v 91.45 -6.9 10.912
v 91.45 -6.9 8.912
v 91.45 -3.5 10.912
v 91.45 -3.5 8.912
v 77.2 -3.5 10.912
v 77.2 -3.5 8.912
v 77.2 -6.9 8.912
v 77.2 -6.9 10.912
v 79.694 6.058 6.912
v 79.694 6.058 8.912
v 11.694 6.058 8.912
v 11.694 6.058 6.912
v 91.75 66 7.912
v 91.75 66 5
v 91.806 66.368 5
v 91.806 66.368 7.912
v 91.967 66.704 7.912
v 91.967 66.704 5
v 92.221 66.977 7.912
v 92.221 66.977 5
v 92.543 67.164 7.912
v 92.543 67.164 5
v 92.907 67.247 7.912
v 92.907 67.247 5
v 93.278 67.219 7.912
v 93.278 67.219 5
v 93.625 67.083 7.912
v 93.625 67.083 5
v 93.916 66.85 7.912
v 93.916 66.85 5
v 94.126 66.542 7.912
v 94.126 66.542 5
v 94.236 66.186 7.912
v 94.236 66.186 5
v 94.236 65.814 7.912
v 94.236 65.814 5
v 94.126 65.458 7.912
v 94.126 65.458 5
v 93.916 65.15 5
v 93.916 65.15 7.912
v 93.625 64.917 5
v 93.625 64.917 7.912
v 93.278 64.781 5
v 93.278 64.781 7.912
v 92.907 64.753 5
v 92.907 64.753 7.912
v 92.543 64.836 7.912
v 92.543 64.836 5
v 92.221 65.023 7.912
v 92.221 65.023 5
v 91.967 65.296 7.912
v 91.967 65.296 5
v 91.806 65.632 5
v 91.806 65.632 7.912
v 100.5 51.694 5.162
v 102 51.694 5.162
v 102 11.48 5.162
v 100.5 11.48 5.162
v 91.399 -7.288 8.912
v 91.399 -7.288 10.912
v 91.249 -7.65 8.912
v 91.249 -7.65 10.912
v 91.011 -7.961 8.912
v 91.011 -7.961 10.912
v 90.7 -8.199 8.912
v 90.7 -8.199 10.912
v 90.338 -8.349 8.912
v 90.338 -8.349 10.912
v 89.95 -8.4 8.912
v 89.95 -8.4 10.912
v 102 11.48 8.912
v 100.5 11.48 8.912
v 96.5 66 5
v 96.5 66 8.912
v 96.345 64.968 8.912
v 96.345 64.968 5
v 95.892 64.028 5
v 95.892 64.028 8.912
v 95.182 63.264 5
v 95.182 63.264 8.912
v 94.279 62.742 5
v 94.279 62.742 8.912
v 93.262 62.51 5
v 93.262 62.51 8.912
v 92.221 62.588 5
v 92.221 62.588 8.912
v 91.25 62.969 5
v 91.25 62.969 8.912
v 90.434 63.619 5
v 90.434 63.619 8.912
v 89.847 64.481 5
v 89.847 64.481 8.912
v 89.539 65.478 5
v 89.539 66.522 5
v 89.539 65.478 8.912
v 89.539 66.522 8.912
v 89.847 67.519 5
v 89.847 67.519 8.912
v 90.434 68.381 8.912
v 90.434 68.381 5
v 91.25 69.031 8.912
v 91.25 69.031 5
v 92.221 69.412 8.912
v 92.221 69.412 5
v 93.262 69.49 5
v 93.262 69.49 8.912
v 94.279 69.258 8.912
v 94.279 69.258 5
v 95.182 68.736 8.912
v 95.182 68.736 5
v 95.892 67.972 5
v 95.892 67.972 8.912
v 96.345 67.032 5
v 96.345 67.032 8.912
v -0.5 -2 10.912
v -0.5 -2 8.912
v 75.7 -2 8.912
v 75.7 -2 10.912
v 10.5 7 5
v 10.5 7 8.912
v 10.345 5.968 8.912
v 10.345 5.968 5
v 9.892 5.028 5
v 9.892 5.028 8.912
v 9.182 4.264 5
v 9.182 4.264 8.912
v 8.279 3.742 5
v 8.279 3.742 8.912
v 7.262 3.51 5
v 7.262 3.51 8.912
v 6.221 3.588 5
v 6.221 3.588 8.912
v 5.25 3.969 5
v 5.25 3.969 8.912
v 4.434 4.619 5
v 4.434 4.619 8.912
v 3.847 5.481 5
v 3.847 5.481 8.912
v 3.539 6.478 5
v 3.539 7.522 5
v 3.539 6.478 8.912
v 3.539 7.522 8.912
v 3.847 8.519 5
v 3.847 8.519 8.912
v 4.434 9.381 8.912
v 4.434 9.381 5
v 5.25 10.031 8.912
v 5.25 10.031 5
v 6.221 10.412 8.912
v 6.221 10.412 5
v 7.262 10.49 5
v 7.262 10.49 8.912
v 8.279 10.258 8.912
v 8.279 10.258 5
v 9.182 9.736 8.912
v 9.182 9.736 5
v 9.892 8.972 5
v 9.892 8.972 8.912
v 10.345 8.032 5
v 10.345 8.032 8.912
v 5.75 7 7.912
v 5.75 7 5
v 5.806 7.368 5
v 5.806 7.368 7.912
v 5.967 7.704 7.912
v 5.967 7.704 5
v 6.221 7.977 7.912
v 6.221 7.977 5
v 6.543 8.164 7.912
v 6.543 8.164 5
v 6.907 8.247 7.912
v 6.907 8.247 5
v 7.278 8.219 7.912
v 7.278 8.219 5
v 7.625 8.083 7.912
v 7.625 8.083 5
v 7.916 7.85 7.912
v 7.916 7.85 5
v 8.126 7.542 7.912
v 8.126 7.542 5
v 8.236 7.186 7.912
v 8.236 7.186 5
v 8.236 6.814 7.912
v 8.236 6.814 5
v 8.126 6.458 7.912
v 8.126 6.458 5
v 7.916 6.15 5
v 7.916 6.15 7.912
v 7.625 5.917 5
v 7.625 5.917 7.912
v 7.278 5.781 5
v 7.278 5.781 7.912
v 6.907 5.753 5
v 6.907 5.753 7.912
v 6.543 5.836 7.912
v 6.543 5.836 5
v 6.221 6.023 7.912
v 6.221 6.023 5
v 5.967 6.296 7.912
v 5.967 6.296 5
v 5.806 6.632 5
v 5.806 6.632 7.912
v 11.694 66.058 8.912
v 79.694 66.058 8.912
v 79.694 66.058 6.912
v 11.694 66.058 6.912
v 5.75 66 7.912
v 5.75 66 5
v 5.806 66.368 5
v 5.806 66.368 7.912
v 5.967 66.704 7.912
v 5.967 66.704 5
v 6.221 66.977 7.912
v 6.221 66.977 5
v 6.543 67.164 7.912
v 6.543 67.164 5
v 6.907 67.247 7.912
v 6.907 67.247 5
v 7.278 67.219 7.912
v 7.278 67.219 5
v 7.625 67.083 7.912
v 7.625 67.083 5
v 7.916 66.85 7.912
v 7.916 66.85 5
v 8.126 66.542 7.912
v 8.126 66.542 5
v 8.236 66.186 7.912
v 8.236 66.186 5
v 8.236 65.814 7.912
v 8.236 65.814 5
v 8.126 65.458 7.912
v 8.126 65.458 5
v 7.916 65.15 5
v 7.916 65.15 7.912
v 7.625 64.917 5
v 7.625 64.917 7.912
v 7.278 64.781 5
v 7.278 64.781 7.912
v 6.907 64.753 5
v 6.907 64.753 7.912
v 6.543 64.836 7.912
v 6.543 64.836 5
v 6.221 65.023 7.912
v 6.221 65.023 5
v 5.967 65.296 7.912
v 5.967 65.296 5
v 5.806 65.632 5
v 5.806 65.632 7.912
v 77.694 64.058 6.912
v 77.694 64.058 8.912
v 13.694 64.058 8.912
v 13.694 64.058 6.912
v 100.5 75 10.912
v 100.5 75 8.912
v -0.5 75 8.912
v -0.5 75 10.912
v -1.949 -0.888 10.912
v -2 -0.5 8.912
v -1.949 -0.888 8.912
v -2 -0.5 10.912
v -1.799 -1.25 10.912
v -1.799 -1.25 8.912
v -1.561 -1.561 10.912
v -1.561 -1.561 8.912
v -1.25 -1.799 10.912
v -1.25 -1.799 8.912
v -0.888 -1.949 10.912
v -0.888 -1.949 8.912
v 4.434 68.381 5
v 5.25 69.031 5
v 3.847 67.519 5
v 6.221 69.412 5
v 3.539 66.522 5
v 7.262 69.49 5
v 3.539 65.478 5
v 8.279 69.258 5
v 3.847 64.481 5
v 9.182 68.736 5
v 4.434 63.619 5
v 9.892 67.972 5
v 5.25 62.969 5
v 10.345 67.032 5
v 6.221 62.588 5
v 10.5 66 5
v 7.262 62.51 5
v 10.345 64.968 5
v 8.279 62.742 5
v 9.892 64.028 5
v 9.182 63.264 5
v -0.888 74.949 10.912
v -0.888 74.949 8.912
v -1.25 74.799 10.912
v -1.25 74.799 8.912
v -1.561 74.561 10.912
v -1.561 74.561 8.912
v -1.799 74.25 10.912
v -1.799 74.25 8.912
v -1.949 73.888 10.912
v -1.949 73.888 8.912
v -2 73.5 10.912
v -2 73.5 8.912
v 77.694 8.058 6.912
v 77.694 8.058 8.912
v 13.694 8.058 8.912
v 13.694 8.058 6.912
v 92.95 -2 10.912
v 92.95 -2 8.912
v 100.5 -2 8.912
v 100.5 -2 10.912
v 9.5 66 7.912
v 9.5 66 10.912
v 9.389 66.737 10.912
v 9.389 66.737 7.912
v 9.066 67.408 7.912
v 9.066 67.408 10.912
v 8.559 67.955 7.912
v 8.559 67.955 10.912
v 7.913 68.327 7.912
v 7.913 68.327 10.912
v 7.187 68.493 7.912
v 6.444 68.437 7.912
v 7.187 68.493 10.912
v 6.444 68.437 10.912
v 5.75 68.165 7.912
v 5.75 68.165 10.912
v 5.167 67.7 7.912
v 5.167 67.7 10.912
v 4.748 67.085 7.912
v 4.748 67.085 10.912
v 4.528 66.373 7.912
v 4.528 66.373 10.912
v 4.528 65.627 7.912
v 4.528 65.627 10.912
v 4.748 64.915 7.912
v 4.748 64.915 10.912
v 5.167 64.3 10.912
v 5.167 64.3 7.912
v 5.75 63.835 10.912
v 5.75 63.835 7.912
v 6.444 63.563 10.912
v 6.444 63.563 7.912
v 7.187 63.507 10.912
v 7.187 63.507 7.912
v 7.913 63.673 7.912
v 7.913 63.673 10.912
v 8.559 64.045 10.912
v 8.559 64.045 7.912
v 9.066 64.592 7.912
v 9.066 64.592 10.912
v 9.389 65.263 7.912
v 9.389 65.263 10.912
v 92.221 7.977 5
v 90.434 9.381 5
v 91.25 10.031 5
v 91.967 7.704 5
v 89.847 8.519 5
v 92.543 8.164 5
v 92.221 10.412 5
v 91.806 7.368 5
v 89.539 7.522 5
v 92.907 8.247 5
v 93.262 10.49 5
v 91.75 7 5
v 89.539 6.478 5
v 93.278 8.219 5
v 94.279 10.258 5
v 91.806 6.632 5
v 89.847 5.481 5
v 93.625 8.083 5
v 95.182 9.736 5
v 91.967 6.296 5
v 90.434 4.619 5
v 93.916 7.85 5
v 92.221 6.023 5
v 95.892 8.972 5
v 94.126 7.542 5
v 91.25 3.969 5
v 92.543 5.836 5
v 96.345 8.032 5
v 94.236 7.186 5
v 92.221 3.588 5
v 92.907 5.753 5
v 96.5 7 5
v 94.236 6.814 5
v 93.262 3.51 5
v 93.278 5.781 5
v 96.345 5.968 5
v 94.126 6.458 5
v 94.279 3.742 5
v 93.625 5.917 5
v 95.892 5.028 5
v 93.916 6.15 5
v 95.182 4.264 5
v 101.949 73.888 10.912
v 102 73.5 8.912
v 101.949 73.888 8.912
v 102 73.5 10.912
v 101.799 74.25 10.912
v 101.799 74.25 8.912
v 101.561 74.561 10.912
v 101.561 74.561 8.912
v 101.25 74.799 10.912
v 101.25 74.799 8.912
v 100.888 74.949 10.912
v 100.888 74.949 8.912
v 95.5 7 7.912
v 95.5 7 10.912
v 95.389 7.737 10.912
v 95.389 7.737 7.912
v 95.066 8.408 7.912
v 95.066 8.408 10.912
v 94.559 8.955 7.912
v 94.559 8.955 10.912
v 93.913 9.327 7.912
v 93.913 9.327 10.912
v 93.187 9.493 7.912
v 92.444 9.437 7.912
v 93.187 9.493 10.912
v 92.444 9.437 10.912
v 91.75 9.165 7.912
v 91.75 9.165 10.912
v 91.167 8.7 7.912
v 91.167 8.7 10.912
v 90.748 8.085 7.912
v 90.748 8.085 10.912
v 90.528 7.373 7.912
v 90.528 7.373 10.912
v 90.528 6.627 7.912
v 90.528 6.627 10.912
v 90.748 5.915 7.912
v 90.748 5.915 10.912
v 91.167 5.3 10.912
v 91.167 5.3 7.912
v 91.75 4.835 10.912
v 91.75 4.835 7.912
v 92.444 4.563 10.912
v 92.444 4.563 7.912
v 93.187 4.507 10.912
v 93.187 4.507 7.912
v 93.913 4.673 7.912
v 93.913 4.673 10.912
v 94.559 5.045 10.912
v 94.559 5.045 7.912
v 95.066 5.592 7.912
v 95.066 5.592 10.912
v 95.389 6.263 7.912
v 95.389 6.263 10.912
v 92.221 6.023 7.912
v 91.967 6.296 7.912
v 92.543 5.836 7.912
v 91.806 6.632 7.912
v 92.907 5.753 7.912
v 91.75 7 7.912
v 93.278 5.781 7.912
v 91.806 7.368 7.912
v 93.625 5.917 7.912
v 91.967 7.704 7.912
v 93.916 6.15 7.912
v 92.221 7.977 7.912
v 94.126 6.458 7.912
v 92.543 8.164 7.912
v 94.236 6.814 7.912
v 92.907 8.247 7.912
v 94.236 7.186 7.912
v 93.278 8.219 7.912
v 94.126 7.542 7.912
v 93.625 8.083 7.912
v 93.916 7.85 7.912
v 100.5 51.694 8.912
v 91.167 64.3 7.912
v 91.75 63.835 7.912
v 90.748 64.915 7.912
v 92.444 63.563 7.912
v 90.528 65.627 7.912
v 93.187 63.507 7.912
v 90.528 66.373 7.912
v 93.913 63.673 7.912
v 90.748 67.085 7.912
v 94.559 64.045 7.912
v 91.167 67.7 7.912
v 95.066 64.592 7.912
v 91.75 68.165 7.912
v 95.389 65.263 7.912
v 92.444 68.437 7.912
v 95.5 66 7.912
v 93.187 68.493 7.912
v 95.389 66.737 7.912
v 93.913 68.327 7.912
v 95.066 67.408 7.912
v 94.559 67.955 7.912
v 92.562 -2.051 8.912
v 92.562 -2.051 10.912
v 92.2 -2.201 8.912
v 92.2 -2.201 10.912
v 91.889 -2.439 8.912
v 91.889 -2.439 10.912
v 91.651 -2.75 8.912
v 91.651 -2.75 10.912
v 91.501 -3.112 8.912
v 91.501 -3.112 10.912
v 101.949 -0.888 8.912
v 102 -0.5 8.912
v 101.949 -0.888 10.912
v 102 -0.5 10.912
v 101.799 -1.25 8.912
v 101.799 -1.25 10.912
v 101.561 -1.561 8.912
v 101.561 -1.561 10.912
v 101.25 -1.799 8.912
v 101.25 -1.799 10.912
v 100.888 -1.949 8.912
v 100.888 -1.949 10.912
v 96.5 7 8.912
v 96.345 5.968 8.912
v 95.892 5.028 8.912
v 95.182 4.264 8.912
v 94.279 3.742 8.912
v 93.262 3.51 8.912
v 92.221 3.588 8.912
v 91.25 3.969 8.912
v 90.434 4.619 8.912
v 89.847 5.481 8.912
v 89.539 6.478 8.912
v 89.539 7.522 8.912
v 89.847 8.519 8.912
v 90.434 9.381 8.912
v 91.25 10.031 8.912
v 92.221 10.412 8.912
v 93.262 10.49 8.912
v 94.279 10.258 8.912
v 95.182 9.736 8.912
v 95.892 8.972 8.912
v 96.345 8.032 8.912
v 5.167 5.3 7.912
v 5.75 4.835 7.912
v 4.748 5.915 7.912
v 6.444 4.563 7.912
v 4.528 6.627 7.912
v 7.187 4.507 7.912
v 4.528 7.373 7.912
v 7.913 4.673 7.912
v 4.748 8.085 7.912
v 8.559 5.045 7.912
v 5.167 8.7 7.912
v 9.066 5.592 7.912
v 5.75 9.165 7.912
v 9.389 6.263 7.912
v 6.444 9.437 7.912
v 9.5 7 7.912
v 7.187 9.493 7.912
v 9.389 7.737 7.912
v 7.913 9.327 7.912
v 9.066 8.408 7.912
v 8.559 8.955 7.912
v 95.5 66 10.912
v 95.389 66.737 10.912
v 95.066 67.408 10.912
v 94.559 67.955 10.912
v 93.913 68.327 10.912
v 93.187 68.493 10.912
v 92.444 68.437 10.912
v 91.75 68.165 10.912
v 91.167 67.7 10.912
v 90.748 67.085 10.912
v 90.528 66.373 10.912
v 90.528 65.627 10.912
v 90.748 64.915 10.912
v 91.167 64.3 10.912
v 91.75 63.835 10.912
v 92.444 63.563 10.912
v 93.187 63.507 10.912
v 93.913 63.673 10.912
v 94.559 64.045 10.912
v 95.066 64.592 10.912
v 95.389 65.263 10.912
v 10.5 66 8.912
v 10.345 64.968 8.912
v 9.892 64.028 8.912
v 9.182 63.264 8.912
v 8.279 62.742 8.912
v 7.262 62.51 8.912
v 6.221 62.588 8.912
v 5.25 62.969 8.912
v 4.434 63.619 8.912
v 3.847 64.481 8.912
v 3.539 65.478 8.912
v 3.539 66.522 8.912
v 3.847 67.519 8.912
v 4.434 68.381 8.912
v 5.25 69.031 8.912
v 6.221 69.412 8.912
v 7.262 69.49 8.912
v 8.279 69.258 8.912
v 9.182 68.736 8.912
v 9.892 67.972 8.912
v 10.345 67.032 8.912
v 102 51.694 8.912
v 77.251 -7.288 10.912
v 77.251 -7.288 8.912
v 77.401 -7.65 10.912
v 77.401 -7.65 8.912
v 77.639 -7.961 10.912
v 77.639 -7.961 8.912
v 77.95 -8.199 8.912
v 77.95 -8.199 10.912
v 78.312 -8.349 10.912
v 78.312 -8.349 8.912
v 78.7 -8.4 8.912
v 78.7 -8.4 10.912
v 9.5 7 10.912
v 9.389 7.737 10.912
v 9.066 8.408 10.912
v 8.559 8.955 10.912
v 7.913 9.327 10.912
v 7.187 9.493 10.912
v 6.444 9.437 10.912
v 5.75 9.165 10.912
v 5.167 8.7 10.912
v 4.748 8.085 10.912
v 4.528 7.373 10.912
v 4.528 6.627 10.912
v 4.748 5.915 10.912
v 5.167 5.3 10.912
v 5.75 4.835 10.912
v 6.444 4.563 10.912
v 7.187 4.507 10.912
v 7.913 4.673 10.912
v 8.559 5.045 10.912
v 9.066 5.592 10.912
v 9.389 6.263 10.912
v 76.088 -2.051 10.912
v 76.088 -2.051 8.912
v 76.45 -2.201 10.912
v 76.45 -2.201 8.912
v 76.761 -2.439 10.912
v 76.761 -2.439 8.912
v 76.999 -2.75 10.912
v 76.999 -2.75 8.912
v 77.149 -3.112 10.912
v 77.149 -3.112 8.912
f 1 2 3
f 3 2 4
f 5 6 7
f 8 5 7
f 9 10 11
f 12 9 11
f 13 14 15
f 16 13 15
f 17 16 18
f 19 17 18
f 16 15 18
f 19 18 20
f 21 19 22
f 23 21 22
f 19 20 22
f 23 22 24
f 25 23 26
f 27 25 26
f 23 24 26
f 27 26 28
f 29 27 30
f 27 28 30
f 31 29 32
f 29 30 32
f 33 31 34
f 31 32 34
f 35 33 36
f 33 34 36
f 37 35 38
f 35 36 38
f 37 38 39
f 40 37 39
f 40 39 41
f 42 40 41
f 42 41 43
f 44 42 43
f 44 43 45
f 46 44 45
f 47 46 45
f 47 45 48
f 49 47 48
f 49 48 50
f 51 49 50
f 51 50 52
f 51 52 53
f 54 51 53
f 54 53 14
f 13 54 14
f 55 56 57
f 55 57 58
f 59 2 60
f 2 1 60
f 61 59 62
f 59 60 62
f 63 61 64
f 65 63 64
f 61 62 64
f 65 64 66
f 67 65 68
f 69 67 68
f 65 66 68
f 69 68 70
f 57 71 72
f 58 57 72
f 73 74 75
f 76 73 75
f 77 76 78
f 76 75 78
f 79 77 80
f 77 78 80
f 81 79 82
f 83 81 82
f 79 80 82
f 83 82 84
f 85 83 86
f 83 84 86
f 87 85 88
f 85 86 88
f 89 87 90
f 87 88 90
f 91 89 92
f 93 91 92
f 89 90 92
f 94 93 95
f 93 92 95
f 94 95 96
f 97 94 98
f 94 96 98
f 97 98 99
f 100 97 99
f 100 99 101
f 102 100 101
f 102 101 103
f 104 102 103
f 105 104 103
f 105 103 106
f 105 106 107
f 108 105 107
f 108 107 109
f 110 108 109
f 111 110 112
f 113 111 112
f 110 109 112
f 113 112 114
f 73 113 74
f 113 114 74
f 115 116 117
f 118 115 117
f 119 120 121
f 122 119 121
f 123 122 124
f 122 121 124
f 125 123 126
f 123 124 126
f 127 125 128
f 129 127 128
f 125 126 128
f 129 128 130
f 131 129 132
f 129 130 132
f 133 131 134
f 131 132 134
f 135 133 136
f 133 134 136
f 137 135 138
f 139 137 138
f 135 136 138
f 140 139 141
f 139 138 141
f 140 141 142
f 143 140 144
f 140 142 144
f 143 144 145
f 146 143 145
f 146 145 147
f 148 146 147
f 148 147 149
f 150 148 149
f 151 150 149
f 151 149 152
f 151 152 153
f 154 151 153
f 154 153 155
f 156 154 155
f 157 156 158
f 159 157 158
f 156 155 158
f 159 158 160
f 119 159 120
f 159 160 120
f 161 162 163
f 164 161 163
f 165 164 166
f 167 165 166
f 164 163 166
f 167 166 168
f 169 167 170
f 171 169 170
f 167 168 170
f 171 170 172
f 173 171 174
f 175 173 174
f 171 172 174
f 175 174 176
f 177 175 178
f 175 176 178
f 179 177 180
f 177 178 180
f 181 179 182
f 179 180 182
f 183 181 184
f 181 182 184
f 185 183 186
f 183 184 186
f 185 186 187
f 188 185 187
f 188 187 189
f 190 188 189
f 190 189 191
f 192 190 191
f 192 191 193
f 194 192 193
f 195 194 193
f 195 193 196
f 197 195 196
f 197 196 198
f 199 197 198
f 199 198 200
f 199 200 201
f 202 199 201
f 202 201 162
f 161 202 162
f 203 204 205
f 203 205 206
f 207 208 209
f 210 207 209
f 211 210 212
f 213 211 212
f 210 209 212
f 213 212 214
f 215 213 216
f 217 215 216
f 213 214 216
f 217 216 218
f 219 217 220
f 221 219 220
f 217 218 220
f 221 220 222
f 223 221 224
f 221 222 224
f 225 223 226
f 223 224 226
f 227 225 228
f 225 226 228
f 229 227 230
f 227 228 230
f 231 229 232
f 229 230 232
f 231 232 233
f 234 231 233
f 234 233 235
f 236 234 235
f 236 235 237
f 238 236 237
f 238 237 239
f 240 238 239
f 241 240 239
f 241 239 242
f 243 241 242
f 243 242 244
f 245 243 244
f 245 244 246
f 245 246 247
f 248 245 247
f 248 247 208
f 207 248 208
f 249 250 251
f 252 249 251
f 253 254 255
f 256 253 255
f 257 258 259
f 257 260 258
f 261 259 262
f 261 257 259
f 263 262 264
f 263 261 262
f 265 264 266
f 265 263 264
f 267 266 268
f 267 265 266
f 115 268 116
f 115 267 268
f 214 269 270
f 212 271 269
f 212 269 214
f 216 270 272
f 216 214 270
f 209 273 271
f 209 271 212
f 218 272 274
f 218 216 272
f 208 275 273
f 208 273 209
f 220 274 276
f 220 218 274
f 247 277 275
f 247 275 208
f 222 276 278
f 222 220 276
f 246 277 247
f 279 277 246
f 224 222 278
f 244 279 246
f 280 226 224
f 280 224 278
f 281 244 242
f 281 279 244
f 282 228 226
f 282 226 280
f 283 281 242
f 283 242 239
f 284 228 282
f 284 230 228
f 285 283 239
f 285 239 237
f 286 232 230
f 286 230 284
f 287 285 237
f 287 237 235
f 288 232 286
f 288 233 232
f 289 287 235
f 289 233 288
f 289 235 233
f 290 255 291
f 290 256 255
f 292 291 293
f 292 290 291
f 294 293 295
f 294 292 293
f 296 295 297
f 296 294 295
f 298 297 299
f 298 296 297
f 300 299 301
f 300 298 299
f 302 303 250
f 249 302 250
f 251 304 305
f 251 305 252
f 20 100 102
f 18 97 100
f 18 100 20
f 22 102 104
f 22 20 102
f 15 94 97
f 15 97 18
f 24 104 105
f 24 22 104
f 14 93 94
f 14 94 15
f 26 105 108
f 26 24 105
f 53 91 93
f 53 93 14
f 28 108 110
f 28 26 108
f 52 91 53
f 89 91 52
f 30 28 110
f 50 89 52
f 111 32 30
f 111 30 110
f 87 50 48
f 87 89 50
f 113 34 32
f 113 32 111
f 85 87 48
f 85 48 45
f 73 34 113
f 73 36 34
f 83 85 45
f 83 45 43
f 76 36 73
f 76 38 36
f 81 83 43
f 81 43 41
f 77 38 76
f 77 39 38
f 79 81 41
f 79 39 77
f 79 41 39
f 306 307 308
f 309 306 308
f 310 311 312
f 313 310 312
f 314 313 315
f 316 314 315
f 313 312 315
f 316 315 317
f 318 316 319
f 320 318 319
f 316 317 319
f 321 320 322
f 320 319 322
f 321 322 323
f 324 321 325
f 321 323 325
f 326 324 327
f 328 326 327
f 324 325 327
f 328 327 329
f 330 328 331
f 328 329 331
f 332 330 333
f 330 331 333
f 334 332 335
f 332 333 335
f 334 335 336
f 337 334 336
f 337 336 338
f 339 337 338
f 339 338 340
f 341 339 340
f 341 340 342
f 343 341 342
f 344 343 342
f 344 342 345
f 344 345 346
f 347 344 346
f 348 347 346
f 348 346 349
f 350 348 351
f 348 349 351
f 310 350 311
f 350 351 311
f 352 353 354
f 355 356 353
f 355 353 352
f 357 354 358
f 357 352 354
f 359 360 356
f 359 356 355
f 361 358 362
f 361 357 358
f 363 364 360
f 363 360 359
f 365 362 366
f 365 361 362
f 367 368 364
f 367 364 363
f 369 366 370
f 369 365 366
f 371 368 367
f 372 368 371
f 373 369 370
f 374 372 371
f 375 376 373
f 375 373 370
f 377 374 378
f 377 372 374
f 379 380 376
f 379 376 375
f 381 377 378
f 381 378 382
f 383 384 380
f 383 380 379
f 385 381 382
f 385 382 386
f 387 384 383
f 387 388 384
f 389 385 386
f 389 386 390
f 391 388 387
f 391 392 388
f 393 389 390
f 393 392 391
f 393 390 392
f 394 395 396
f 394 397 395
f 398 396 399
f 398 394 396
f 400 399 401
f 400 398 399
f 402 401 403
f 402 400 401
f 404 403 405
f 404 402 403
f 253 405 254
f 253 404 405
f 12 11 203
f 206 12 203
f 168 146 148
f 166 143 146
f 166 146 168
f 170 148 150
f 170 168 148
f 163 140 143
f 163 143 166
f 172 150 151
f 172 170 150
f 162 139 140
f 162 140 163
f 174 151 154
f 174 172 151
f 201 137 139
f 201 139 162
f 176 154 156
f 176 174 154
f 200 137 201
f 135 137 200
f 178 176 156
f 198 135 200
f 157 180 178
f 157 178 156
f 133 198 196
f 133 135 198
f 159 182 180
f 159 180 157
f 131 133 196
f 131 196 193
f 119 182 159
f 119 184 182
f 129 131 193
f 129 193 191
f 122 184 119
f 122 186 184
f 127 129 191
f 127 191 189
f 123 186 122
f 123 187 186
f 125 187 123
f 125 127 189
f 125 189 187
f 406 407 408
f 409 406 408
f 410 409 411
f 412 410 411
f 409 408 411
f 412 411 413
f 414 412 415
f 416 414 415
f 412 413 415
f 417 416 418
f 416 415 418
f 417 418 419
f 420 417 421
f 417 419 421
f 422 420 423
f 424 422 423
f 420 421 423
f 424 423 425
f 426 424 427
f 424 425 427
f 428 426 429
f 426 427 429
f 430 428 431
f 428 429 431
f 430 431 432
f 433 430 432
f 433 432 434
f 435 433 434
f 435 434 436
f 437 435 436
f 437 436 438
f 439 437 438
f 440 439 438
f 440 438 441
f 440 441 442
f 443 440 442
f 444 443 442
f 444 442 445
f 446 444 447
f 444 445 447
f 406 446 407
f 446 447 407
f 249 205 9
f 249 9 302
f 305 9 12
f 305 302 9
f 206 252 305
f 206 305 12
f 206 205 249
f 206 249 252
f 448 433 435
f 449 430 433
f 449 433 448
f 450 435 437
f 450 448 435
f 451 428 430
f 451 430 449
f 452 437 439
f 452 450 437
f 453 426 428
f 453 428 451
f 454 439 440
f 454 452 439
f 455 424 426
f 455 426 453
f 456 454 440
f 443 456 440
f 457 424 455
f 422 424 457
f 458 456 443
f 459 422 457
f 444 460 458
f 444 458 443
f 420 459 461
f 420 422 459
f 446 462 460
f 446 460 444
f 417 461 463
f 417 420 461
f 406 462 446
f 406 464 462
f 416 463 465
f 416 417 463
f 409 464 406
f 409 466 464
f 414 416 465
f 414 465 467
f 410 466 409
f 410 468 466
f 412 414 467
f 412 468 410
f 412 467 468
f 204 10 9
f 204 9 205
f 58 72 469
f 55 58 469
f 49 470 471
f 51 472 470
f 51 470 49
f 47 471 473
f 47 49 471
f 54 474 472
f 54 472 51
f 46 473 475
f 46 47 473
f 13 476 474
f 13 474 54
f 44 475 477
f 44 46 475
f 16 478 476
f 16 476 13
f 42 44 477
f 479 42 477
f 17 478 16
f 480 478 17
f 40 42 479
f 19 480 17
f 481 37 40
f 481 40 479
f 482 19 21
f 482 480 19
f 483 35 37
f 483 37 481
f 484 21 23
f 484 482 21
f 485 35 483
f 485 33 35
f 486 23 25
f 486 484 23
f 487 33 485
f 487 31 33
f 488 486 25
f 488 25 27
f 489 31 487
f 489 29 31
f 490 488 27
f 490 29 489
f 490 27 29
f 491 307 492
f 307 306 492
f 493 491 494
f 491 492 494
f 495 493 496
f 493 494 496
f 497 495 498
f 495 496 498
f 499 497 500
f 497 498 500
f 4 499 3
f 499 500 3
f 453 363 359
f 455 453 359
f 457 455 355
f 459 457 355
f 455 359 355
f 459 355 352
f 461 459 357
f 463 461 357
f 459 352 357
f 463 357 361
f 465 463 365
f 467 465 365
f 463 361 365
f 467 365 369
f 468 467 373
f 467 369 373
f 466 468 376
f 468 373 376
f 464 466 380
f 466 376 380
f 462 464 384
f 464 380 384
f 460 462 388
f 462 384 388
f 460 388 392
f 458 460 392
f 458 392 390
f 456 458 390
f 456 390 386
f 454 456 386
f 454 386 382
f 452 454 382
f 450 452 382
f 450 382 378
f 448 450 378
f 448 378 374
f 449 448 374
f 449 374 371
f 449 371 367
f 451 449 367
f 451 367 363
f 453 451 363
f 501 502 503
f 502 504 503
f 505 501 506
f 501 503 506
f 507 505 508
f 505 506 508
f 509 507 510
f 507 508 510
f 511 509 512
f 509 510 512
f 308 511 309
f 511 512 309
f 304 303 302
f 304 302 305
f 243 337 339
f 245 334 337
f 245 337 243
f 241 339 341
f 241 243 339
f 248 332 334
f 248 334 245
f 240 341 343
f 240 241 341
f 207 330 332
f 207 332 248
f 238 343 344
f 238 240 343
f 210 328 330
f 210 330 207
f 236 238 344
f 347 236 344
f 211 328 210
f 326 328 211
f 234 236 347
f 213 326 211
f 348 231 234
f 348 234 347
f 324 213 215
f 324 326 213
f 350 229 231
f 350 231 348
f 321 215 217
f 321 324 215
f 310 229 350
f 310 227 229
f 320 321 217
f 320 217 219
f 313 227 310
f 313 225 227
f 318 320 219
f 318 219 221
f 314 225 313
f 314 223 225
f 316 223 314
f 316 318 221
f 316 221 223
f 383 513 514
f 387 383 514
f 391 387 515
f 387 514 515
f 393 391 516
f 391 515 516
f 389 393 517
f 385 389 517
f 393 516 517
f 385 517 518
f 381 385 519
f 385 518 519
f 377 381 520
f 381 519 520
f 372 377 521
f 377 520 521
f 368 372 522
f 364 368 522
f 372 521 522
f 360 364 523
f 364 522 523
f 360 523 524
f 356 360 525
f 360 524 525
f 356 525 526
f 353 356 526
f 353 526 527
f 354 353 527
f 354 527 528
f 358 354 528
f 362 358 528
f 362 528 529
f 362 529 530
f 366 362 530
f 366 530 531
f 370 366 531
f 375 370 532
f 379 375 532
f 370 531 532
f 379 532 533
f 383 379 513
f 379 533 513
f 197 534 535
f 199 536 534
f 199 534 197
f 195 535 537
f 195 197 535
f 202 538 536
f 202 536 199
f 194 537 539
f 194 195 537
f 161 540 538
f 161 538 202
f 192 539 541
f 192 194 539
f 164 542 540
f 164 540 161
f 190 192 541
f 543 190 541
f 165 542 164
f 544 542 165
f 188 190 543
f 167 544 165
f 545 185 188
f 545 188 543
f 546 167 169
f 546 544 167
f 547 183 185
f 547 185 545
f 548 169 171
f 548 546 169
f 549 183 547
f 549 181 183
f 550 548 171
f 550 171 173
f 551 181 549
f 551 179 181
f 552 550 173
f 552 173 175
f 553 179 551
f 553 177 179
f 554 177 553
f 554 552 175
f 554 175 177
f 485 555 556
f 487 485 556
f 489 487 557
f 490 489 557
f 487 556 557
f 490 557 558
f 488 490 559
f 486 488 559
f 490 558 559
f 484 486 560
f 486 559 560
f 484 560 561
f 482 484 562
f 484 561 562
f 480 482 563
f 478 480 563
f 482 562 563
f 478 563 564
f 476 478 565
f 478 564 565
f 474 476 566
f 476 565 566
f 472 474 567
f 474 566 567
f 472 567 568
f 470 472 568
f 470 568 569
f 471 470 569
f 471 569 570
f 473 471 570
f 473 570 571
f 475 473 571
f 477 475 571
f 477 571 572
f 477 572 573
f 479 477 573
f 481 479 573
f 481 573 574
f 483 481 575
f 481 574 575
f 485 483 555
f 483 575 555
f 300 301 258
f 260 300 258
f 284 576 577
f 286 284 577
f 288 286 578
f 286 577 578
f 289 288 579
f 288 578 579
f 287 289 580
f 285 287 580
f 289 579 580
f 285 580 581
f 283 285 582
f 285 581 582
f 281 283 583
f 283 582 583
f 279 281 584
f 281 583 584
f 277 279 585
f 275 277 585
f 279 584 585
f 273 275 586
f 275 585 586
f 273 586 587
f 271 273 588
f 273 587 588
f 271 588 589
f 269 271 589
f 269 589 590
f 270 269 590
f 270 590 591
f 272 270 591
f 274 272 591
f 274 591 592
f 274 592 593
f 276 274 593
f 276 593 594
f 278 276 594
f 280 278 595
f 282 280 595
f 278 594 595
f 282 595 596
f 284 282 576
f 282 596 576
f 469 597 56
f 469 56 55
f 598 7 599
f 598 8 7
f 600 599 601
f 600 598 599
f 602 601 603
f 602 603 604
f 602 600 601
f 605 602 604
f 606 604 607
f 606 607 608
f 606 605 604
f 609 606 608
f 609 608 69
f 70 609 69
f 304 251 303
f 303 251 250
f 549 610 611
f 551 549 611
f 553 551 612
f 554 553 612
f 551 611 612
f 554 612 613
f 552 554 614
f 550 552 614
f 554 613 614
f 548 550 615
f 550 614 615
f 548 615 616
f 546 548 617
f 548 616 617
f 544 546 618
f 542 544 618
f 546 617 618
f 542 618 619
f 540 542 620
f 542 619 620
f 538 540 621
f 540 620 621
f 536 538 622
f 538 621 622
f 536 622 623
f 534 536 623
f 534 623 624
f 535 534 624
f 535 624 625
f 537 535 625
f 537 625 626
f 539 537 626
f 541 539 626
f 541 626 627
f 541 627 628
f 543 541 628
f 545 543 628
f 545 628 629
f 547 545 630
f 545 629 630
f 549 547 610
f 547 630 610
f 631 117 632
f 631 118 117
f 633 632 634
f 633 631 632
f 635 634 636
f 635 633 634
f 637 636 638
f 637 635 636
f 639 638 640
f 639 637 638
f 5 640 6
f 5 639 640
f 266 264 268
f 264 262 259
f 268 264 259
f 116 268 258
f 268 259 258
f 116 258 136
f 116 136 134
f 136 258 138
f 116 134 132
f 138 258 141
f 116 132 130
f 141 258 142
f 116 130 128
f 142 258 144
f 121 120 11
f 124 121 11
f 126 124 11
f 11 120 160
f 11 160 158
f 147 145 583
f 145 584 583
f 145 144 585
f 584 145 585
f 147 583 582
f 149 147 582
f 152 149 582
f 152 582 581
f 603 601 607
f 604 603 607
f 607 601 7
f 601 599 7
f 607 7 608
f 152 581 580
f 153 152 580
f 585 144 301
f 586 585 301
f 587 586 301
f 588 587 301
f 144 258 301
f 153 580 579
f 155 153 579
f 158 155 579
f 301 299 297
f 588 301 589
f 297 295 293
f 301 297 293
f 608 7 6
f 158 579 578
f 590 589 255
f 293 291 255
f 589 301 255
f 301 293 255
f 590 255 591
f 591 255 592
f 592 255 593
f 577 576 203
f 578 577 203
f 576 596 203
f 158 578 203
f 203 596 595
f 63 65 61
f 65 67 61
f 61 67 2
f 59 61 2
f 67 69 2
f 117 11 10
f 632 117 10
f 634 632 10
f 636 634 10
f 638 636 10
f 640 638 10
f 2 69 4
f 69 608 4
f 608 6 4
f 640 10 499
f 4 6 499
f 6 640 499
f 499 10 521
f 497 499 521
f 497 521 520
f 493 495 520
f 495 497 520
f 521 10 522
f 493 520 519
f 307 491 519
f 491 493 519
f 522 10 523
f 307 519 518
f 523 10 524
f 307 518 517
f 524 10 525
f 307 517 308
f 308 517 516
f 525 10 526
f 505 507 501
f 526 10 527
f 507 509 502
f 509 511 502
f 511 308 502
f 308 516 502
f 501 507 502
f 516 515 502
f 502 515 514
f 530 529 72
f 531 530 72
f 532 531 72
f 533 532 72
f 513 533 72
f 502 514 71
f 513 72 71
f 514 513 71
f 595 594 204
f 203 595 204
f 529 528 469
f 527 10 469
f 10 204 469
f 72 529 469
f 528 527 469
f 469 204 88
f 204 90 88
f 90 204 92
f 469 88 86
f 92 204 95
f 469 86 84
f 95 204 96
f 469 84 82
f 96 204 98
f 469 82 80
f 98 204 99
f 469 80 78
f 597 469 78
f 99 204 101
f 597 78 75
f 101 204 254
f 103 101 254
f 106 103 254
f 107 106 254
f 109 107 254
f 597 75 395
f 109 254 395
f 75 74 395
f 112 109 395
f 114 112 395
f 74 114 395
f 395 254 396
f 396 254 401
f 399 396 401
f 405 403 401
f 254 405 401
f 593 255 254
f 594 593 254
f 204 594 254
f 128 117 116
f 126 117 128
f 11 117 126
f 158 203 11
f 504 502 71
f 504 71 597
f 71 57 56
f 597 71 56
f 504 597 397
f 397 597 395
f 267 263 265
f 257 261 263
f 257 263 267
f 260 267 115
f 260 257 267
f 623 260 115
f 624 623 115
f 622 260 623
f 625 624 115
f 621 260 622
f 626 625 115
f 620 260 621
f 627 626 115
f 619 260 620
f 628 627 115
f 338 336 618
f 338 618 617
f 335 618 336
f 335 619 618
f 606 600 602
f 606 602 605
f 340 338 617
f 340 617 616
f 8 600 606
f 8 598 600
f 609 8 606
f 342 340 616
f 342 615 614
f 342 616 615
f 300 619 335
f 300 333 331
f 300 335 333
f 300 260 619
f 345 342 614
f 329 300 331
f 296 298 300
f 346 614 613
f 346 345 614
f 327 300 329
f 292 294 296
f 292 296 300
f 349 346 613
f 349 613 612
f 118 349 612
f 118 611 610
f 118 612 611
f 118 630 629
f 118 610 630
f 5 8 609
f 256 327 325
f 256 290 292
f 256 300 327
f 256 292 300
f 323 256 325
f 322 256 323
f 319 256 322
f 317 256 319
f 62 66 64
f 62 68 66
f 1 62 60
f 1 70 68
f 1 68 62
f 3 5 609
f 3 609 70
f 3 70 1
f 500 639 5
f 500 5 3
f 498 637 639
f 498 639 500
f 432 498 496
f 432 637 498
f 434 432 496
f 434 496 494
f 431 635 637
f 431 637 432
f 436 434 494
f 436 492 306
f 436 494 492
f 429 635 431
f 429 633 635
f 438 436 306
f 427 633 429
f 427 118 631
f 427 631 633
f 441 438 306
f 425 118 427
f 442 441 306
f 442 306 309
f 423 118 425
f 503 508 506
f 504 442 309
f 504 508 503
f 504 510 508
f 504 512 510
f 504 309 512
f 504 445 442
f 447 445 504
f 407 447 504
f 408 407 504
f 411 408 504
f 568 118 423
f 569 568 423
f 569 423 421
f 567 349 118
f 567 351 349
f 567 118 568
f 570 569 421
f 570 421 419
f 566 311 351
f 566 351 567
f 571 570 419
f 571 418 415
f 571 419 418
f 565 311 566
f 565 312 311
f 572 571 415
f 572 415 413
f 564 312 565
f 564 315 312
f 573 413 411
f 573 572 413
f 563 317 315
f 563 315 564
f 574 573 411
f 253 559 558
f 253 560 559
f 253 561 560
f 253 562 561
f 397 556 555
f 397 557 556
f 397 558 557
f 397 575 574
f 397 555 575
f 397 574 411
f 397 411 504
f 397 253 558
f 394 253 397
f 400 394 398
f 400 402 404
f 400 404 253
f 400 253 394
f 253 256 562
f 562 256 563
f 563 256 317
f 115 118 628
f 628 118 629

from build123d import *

# Parameters (mm, degrees)
BOTTOM_COVER_DEPTH    = 2
SKETCH5_W             = 1.5
SKETCH5_H             = 40.214188303
CONNECTOR_PANEL_DEPTH = 3.75
SKETCH6_W             = 68
SKETCH6_H             = 60
SKETCH6_W_2           = 64
SKETCH6_H_2           = 56
BATTERY_HOLDER_DEPTH  = 2
FILLET1_R             = 1.5
SKETCH7_R             = 3.5
BOSS_EXTRUDE4_DEPTH   = 3.9125
SKETCH8_R             = 1.25
CUT_EXTRUDE1_DEPTH    = 10
SKETCH9_R             = 2.5
CUT_EXTRUDE2_DEPTH    = 3


with BuildPart() as part:
    # Sketch1 → bottom-cover (new body)
    with BuildSketch(Plane.XY.offset(8.9125)):
        Polygon((102, -2), (102, 75), (-2, 75), (-2, -2), (77.2, -2), (77.2, -8.39995), (91.45, -8.39995), (91.45, -2), align=None)
    extrude(amount=BOTTOM_COVER_DEPTH)

    # Sketch5 → connector-panel (add)
    with BuildSketch(Plane(origin=(0, 0, 8.9125), x_dir=(-1, 0, 0), z_dir=(0, 0, -1))):
        with Locations((-101.25, 31.586987543)):
            Rectangle(SKETCH5_W, SKETCH5_H)
    extrude(amount=CONNECTOR_PANEL_DEPTH)

    # Sketch6 → battery-holder (add)
    with BuildSketch(Plane(origin=(0, 0, 8.9125), x_dir=(-1, 0, 0), z_dir=(0, 0, -1))):
        with Locations((-45.693698314, 36.057827653)):
            Rectangle(SKETCH6_W, SKETCH6_H)
        with Locations((-45.693698314, 36.057827653)):
            Rectangle(SKETCH6_W_2, SKETCH6_H_2, mode=Mode.SUBTRACT)
    extrude(amount=BATTERY_HOLDER_DEPTH)

    # Fillet1
    fillet1_edges = [part.edges().sort_by_distance(p)[0] for p in [
        (102, -2, 9.9125),
        (102, 75, 9.9125),
        (-2, 75, 9.9125),
        (91.45, -8.39995, 9.9125),
        (91.45, -2, 9.9125),
        (77.2, -2, 9.9125),
        (77.2, -8.39995, 9.9125),
        (-2, -2, 9.9125),
    ]]
    fillet(fillet1_edges, radius=FILLET1_R)

    # Sketch7 → Boss-Extrude4 (add)
    with BuildSketch(Plane(origin=(0, 0, 8.9125), x_dir=(-1, 0, 0), z_dir=(0, 0, -1))):
        with Locations(Location((-7, 66, 0), (0, 0, 180))):
            Circle(SKETCH7_R)
        with Locations(Location((-7, 7, 0), (0, 0, 180))):
            Circle(SKETCH7_R)
        with Locations(Location((-93, 7, 0), (0, 0, 180))):
            Circle(SKETCH7_R)
        with Locations(Location((-93, 66, 0), (0, 0, 180))):
            Circle(SKETCH7_R)
    extrude(amount=BOSS_EXTRUDE4_DEPTH)

    # Sketch8 → Cut-Extrude1 (cut)
    with BuildSketch(Plane(origin=(0, 0, 5), x_dir=(-1, 0, 0), z_dir=(0, 0, -1))):
        with Locations((-93, 66)):
            Circle(SKETCH8_R)
        with Locations((-7, 66)):
            Circle(SKETCH8_R)
        with Locations((-7, 7)):
            Circle(SKETCH8_R)
        with Locations((-93, 7)):
            Circle(SKETCH8_R)
    extrude(amount=-CUT_EXTRUDE1_DEPTH, mode=Mode.SUBTRACT)

    # Sketch9 → Cut-Extrude2 (cut)
    with BuildSketch(Plane.XY.offset(10.9125)):
        with Locations((7, 66)):
            Circle(SKETCH9_R)
        with Locations((93, 66)):
            Circle(SKETCH9_R)
        with Locations((93, 7)):
            Circle(SKETCH9_R)
        with Locations((7, 7)):
            Circle(SKETCH9_R)
    extrude(amount=-CUT_EXTRUDE2_DEPTH, mode=Mode.SUBTRACT)


solid = part.part
